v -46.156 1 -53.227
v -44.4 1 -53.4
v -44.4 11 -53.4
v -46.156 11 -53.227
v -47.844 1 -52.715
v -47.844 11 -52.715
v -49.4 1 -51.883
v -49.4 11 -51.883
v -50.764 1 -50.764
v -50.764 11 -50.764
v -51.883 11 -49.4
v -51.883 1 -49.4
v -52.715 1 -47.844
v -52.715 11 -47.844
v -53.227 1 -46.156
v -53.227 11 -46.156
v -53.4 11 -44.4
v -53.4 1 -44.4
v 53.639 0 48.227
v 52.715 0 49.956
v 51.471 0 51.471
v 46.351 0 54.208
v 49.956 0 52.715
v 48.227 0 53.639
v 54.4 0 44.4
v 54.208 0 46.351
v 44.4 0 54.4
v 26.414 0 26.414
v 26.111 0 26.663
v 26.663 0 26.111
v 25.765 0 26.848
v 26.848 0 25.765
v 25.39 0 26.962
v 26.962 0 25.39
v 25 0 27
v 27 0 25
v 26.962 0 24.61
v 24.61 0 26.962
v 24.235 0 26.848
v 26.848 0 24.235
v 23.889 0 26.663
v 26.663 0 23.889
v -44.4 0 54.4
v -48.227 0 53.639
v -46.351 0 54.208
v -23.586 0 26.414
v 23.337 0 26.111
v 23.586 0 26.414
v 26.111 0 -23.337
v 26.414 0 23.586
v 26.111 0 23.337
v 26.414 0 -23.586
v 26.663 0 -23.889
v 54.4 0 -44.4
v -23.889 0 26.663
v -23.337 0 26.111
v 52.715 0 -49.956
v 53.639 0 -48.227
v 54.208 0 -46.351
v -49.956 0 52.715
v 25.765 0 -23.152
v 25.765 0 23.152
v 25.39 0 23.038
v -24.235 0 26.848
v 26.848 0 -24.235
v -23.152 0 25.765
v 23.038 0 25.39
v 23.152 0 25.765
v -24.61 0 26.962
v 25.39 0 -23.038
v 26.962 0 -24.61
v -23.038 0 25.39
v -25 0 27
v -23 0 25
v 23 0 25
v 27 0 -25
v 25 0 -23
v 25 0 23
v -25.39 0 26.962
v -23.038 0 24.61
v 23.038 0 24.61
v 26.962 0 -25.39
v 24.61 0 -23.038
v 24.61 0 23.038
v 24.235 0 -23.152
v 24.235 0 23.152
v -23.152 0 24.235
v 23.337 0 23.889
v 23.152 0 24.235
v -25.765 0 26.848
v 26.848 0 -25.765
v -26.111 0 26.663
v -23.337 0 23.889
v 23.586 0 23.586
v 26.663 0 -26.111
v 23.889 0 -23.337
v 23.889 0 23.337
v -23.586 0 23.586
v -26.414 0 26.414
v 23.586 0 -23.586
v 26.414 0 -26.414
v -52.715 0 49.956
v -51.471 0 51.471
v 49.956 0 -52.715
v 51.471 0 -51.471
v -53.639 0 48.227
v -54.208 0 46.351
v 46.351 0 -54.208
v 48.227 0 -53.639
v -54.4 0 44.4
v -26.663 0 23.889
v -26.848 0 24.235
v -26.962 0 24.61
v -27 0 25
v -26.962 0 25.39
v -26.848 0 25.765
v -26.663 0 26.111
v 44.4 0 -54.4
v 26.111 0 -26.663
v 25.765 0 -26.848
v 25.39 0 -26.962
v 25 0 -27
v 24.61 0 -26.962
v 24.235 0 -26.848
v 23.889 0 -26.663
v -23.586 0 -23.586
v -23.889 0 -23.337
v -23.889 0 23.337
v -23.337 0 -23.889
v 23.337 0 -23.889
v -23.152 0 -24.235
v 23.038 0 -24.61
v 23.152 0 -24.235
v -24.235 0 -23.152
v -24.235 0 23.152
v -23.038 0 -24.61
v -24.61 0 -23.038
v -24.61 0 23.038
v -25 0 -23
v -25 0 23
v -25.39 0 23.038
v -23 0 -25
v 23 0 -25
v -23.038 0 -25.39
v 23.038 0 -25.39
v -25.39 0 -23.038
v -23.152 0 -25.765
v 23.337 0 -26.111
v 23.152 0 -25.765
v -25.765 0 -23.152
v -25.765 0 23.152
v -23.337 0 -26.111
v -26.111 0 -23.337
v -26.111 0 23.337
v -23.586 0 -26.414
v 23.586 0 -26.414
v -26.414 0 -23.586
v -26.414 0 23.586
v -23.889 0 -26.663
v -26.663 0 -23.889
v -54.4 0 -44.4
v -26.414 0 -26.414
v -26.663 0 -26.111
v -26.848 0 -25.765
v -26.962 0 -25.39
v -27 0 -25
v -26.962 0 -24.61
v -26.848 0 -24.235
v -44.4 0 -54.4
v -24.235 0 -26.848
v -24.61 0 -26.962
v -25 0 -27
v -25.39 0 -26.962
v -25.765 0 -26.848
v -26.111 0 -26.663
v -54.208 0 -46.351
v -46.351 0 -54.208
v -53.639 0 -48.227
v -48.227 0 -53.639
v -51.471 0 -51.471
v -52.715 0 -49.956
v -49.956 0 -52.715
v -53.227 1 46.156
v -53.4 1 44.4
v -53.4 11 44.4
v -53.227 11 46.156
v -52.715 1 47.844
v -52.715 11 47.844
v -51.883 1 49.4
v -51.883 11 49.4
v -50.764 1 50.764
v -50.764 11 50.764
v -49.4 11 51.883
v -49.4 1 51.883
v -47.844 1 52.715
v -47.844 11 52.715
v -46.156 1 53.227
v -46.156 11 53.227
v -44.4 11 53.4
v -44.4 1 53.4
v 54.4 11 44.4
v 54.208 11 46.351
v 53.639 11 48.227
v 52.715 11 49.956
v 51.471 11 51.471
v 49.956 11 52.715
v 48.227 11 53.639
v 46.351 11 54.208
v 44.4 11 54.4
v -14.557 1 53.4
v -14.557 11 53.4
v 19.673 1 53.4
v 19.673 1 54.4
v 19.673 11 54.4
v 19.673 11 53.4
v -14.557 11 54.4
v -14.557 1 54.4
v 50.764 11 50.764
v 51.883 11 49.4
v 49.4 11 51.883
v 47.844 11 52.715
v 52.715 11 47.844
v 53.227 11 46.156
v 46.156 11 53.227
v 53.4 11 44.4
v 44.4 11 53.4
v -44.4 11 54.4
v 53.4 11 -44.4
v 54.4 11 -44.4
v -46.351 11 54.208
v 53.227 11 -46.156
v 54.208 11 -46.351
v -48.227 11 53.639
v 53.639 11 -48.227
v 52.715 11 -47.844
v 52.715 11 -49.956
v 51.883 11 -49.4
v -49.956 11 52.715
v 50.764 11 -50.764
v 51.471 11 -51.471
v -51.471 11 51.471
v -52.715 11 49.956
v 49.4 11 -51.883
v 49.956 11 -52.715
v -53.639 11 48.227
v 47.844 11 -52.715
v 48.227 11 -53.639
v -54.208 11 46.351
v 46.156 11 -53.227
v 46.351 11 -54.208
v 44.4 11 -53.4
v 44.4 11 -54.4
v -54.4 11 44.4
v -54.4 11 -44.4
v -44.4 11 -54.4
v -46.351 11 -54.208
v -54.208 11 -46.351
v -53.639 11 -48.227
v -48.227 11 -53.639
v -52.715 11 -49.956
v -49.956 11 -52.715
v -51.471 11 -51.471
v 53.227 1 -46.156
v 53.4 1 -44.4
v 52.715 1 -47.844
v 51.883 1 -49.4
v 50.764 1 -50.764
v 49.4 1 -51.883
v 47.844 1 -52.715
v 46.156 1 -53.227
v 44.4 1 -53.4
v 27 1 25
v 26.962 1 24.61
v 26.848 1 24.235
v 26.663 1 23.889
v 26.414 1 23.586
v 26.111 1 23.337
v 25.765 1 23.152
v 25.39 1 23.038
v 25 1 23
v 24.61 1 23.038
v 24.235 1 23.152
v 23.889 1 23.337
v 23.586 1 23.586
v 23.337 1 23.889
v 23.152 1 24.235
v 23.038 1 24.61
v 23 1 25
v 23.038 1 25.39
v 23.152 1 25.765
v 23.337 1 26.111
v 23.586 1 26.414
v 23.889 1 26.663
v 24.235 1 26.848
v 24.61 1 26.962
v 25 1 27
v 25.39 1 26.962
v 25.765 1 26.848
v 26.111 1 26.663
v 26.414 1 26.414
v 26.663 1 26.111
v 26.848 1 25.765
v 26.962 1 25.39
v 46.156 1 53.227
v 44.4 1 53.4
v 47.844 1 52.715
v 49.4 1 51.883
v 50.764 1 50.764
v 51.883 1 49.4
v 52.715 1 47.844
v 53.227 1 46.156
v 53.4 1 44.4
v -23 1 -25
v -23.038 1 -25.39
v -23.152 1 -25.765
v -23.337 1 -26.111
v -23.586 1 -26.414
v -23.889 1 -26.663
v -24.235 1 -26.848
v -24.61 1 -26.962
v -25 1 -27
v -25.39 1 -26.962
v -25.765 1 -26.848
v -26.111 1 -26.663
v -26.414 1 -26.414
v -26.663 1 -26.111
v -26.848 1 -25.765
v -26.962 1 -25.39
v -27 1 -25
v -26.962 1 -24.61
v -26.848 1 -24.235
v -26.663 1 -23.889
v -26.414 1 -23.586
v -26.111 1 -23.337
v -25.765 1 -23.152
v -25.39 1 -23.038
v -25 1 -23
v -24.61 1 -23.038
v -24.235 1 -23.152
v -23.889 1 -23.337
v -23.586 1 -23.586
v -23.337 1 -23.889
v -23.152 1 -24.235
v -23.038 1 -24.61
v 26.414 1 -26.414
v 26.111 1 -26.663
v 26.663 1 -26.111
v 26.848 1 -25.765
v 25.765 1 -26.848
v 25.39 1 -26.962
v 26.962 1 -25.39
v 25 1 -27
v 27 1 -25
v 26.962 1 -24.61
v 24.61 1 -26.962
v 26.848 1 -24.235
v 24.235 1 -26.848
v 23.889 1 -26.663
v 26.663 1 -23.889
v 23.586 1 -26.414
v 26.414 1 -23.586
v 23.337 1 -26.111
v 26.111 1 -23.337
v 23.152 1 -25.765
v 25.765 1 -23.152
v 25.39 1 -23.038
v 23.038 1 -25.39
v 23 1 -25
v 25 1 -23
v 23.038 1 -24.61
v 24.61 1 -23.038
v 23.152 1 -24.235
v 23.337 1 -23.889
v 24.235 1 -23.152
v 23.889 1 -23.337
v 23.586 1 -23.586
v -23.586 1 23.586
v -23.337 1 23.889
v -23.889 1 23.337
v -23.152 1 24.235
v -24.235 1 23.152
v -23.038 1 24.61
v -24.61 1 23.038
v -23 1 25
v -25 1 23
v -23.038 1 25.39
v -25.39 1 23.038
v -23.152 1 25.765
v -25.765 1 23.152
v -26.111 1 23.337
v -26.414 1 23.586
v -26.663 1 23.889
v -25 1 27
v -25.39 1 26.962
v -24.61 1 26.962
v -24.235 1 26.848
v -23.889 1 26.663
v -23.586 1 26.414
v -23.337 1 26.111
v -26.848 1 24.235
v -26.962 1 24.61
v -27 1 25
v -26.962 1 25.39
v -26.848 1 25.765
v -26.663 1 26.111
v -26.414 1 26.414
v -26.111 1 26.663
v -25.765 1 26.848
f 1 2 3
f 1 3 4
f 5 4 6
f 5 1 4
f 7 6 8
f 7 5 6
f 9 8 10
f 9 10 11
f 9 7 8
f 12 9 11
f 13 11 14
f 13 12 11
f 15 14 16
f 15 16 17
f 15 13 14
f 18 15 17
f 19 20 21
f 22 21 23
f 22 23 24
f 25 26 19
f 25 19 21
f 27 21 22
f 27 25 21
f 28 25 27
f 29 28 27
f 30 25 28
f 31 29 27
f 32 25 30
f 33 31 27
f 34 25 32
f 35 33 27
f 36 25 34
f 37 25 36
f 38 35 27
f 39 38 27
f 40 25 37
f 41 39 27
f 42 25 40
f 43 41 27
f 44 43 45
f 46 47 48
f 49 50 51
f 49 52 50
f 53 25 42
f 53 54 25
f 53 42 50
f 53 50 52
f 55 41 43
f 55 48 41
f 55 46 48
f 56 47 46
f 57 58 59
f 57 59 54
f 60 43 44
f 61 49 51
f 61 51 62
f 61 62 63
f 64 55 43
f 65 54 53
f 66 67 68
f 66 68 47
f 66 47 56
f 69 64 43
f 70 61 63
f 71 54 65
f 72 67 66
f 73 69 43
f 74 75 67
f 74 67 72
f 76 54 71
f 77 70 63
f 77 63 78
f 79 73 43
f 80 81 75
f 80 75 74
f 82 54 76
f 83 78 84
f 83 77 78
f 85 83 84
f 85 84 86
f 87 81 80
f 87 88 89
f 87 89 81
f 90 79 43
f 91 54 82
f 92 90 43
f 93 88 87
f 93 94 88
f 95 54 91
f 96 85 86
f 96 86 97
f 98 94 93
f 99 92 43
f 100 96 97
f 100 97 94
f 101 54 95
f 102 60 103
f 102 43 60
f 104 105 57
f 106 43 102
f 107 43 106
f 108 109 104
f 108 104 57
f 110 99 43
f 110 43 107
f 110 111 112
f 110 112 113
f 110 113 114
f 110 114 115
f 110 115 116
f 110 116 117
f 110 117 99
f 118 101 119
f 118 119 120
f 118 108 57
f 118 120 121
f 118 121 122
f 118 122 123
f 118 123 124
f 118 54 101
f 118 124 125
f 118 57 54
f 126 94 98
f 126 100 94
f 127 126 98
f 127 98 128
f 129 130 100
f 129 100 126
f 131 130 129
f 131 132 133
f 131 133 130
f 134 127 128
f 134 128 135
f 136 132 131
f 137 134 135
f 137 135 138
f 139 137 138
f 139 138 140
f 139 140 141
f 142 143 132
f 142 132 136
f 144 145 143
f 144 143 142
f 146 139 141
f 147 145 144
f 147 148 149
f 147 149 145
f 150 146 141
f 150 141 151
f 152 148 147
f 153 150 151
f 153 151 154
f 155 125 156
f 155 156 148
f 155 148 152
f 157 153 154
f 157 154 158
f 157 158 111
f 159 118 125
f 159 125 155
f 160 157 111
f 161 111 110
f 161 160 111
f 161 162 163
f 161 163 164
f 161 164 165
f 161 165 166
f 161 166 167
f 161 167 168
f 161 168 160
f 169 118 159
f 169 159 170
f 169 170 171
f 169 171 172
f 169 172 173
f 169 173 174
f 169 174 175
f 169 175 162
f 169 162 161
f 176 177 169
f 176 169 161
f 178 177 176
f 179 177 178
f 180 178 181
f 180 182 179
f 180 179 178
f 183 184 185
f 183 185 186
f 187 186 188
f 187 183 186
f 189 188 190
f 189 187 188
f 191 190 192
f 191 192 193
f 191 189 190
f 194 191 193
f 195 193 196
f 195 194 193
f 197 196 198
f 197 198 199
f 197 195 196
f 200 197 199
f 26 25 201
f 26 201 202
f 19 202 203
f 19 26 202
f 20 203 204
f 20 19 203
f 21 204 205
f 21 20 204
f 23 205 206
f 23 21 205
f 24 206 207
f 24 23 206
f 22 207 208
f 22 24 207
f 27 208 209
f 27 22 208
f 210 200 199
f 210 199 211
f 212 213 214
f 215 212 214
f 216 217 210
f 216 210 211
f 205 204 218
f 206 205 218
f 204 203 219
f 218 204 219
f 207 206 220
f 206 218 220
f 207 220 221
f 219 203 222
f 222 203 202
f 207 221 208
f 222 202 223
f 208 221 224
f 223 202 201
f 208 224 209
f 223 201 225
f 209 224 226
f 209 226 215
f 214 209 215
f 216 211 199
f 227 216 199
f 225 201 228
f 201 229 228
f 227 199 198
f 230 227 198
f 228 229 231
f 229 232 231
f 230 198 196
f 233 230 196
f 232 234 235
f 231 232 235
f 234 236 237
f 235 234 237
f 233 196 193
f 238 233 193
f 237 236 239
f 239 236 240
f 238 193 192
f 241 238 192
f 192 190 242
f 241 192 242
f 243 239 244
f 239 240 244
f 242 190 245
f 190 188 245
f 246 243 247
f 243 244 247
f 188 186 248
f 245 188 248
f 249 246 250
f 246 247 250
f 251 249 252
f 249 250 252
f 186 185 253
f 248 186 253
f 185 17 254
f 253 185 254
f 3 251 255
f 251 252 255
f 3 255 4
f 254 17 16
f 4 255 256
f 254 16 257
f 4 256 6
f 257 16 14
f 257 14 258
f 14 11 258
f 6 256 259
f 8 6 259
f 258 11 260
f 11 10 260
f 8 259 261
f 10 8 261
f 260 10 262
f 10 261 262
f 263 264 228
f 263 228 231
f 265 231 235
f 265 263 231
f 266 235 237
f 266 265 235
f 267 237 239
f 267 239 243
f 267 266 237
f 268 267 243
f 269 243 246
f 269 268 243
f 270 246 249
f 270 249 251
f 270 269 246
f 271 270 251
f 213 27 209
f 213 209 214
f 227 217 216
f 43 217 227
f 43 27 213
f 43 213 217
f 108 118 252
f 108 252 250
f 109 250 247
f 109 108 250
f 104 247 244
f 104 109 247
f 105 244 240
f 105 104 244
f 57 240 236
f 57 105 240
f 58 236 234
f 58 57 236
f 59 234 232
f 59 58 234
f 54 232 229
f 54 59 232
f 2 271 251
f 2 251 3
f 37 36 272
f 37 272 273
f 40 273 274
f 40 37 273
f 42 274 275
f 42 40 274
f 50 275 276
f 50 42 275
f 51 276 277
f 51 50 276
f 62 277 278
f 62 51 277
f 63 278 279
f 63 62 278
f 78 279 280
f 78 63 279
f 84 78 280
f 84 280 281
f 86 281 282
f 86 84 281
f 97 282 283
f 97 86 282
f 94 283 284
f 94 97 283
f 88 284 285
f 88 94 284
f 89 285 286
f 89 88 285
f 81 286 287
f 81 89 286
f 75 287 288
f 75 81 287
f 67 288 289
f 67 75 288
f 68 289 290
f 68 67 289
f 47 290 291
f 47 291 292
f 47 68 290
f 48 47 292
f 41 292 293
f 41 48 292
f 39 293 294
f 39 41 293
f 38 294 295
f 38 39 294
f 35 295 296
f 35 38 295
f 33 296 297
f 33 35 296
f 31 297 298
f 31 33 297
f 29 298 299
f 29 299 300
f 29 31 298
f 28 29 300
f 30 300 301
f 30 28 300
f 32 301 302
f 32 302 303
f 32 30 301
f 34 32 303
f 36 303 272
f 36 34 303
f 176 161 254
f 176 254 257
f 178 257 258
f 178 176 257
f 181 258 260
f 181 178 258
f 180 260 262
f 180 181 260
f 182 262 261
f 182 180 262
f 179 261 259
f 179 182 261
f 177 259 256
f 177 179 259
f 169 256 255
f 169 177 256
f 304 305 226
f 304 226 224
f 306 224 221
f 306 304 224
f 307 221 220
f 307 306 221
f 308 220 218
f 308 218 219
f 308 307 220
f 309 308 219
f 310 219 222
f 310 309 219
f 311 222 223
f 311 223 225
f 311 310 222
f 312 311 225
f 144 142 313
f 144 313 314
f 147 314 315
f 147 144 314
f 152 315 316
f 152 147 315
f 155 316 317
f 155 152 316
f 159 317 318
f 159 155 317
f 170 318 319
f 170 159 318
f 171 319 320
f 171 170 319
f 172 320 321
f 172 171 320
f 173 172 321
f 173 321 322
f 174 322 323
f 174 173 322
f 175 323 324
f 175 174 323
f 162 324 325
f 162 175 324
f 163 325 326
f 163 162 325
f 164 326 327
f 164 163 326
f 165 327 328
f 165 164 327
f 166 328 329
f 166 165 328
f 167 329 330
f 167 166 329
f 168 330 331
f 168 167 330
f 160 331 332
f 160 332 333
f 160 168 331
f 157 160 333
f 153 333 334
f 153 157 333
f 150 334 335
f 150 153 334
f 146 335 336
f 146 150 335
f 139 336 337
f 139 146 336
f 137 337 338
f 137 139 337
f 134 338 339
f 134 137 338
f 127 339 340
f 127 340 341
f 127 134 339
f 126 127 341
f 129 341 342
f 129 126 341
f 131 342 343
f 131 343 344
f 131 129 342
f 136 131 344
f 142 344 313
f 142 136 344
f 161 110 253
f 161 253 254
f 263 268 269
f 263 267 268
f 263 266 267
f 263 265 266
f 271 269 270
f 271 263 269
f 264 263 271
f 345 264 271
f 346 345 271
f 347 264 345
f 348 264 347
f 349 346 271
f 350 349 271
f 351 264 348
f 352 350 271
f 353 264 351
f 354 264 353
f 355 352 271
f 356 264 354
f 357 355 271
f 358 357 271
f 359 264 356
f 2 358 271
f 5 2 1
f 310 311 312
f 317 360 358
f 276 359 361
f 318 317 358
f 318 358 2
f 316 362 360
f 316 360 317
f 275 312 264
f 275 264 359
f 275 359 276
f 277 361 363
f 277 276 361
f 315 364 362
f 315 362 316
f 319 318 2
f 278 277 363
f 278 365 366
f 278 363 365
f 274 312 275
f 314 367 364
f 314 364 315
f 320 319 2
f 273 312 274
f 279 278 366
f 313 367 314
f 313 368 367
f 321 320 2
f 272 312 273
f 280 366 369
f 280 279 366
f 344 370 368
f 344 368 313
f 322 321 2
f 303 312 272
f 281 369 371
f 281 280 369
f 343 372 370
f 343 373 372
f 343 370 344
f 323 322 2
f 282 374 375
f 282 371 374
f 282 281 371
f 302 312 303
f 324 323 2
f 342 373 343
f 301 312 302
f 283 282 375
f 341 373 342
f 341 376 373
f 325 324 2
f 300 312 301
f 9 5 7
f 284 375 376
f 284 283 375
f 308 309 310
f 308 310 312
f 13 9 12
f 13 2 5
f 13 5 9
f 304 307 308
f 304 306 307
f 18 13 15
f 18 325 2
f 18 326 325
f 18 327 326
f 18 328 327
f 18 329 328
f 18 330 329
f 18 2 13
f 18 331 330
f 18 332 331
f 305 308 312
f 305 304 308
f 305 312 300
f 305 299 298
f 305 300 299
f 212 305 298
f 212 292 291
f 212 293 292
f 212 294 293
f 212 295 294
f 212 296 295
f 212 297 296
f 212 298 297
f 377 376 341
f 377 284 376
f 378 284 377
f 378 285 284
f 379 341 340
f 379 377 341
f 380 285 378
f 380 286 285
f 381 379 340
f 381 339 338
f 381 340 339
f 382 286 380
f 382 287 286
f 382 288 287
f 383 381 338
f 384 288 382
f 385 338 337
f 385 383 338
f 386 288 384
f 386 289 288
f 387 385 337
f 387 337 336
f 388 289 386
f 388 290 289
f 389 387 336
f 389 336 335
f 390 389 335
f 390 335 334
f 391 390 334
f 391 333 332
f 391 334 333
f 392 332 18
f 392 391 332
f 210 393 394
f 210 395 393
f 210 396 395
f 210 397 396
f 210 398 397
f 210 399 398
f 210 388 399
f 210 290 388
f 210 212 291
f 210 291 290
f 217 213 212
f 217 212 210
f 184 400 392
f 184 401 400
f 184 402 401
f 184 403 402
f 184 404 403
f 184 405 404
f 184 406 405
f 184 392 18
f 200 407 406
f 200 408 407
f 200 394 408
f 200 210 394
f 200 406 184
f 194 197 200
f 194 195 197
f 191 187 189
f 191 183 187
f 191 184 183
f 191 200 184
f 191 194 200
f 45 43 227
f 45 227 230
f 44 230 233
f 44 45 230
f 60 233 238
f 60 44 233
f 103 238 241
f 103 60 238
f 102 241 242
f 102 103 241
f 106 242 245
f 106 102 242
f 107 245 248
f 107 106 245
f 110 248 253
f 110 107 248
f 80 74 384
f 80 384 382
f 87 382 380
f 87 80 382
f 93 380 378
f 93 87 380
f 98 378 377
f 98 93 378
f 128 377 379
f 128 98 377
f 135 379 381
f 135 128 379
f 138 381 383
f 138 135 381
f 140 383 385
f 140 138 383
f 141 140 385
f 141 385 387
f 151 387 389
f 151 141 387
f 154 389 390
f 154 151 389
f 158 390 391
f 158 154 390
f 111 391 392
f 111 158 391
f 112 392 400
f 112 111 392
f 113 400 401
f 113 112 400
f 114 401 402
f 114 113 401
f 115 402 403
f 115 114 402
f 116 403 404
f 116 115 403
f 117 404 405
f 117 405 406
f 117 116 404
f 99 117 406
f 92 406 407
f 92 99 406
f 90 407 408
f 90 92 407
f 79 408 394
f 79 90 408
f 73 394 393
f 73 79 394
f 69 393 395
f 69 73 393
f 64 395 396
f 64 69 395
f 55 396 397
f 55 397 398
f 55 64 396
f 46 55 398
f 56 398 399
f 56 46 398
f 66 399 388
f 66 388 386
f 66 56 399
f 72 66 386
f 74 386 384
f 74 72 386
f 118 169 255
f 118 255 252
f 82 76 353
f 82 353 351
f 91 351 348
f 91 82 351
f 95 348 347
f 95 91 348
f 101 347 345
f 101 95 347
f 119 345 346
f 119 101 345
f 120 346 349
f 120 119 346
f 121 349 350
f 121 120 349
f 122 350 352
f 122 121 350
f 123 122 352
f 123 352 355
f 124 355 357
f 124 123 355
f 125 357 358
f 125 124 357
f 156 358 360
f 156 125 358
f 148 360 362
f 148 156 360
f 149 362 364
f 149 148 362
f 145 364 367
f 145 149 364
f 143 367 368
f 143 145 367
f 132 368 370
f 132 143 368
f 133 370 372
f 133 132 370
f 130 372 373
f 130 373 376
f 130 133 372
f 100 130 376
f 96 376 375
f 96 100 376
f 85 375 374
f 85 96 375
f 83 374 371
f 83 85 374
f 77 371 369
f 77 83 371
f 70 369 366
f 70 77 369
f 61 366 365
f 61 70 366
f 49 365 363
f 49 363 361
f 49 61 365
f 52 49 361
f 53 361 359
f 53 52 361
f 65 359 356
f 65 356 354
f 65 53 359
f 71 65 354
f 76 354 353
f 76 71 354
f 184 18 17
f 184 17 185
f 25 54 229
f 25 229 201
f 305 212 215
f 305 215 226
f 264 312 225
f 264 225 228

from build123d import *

# Parameters (mm, degrees)
SKETCH1_R           = 2
BOSS_EXTRUDE1_DEPTH = 1
BOSS_EXTRUDE2_DEPTH = 11
SKETCH3_W           = 34.23
SKETCH3_H           = 19.064187878
CUT_EXTRUDE2_DEPTH  = 1


with BuildPart() as part:
    # Sketch1 → Boss-Extrude1 (new body)
    with BuildSketch(Plane(origin=(0, 0, 0), x_dir=(1, 0, 0), z_dir=(0, 1, 0))):
        with BuildLine():
            ThreePointArc((-44.4, -53.4), (-50.763961031, -50.763961031), (-53.4, -44.4))
            Line((-53.4, -44.4), (-53.4, 44.4))
            ThreePointArc((-53.4, 44.4), (-50.763961031, 50.763961031), (-44.4, 53.4))
            Line((-44.4, 53.4), (44.4, 53.4))
            ThreePointArc((44.4, 53.4), (50.763961031, 50.763961031), (53.4, 44.4))
            Line((53.4, 44.4), (53.4, -44.4))
            ThreePointArc((53.4, -44.4), (50.763961031, -50.763961031), (44.4, -53.4))
            Line((44.4, -53.4), (-44.4, -53.4))
        make_face()
        with BuildLine():
            Line((-29, -25), (-29, 25))
            ThreePointArc((-29, 25), (-27.828427125, 27.828427125), (-25, 29))
            Line((-25, 29), (25, 29))
            ThreePointArc((25, 29), (27.828427125, 27.828427125), (29, 25))
            Line((29, 25), (29, -25))
            ThreePointArc((29, -25), (27.828427125, -27.828427125), (25, -29))
            Line((25, -29), (-25, -29))
            ThreePointArc((-25, -29), (-27.828427125, -27.828427125), (-29, -25))
        make_face(mode=Mode.SUBTRACT)
        with BuildLine():
            ThreePointArc((-29, 25), (-27.828427125, 27.828427125), (-25, 29))
            Line((-25, 29), (25, 29))
            ThreePointArc((25, 29), (27.828427125, 27.828427125), (29, 25))
            Line((29, 25), (29, -25))
            ThreePointArc((29, -25), (27.828427125, -27.828427125), (25, -29))
            Line((25, -29), (-25, -29))
            ThreePointArc((-25, -29), (-27.828427125, -27.828427125), (-29, -25))
            Line((-29, -25), (-29, 25))
        make_face()
        with Locations((25, -25)):
            Circle(SKETCH1_R, mode=Mode.SUBTRACT)
        with Locations((25, 25)):
            Circle(SKETCH1_R, mode=Mode.SUBTRACT)
        with Locations((-25, 25)):
            Circle(SKETCH1_R, mode=Mode.SUBTRACT)
        with Locations((-25, -25)):
            Circle(SKETCH1_R, mode=Mode.SUBTRACT)
    extrude(amount=BOSS_EXTRUDE1_DEPTH)

    # Sketch1<5> → Boss-Extrude2 (add)
    with BuildSketch(Plane(origin=(0, 0, 0), x_dir=(1, 0, 0), z_dir=(0, 1, 0))):
        with BuildLine():
            ThreePointArc((-54.4, 44.4), (-51.471067812, 51.471067812), (-44.4, 54.4))
            Line((-44.4, 54.4), (44.4, 54.4))
            ThreePointArc((44.4, 54.4), (51.471067812, 51.471067812), (54.4, 44.4))
            Line((54.4, 44.4), (54.4, -44.4))
            ThreePointArc((54.4, -44.4), (51.471067812, -51.471067812), (44.4, -54.4))
            Line((44.4, -54.4), (-44.4, -54.4))
            ThreePointArc((-44.4, -54.4), (-51.471067812, -51.471067812), (-54.4, -44.4))
            Line((-54.4, -44.4), (-54.4, 44.4))
        make_face()
        with BuildLine():
            Line((-44.4, -53.4), (44.4, -53.4))
            ThreePointArc((44.4, -53.4), (50.763961031, -50.763961031), (53.4, -44.4))
            Line((53.4, -44.4), (53.4, 44.4))
            ThreePointArc((53.4, 44.4), (50.763961031, 50.763961031), (44.4, 53.4))
            Line((44.4, 53.4), (-44.4, 53.4))
            ThreePointArc((-44.4, 53.4), (-50.763961031, 50.763961031), (-53.4, 44.4))
            Line((-53.4, 44.4), (-53.4, -44.4))
            ThreePointArc((-53.4, -44.4), (-50.763961031, -50.763961031), (-44.4, -53.4))
        make_face(mode=Mode.SUBTRACT)
    extrude(amount=BOSS_EXTRUDE2_DEPTH)

    # Sketch3 → Cut-Extrude2 (cut)
    with BuildSketch(Plane(origin=(0, 0, 54.4), x_dir=(-1, 0, 0), z_dir=(0, 0, -1))):
        with Locations((-2.557601794, 10.532093939)):
            Rectangle(SKETCH3_W, SKETCH3_H)
    extrude(amount=CUT_EXTRUDE2_DEPTH, mode=Mode.SUBTRACT)


solid = part.part
